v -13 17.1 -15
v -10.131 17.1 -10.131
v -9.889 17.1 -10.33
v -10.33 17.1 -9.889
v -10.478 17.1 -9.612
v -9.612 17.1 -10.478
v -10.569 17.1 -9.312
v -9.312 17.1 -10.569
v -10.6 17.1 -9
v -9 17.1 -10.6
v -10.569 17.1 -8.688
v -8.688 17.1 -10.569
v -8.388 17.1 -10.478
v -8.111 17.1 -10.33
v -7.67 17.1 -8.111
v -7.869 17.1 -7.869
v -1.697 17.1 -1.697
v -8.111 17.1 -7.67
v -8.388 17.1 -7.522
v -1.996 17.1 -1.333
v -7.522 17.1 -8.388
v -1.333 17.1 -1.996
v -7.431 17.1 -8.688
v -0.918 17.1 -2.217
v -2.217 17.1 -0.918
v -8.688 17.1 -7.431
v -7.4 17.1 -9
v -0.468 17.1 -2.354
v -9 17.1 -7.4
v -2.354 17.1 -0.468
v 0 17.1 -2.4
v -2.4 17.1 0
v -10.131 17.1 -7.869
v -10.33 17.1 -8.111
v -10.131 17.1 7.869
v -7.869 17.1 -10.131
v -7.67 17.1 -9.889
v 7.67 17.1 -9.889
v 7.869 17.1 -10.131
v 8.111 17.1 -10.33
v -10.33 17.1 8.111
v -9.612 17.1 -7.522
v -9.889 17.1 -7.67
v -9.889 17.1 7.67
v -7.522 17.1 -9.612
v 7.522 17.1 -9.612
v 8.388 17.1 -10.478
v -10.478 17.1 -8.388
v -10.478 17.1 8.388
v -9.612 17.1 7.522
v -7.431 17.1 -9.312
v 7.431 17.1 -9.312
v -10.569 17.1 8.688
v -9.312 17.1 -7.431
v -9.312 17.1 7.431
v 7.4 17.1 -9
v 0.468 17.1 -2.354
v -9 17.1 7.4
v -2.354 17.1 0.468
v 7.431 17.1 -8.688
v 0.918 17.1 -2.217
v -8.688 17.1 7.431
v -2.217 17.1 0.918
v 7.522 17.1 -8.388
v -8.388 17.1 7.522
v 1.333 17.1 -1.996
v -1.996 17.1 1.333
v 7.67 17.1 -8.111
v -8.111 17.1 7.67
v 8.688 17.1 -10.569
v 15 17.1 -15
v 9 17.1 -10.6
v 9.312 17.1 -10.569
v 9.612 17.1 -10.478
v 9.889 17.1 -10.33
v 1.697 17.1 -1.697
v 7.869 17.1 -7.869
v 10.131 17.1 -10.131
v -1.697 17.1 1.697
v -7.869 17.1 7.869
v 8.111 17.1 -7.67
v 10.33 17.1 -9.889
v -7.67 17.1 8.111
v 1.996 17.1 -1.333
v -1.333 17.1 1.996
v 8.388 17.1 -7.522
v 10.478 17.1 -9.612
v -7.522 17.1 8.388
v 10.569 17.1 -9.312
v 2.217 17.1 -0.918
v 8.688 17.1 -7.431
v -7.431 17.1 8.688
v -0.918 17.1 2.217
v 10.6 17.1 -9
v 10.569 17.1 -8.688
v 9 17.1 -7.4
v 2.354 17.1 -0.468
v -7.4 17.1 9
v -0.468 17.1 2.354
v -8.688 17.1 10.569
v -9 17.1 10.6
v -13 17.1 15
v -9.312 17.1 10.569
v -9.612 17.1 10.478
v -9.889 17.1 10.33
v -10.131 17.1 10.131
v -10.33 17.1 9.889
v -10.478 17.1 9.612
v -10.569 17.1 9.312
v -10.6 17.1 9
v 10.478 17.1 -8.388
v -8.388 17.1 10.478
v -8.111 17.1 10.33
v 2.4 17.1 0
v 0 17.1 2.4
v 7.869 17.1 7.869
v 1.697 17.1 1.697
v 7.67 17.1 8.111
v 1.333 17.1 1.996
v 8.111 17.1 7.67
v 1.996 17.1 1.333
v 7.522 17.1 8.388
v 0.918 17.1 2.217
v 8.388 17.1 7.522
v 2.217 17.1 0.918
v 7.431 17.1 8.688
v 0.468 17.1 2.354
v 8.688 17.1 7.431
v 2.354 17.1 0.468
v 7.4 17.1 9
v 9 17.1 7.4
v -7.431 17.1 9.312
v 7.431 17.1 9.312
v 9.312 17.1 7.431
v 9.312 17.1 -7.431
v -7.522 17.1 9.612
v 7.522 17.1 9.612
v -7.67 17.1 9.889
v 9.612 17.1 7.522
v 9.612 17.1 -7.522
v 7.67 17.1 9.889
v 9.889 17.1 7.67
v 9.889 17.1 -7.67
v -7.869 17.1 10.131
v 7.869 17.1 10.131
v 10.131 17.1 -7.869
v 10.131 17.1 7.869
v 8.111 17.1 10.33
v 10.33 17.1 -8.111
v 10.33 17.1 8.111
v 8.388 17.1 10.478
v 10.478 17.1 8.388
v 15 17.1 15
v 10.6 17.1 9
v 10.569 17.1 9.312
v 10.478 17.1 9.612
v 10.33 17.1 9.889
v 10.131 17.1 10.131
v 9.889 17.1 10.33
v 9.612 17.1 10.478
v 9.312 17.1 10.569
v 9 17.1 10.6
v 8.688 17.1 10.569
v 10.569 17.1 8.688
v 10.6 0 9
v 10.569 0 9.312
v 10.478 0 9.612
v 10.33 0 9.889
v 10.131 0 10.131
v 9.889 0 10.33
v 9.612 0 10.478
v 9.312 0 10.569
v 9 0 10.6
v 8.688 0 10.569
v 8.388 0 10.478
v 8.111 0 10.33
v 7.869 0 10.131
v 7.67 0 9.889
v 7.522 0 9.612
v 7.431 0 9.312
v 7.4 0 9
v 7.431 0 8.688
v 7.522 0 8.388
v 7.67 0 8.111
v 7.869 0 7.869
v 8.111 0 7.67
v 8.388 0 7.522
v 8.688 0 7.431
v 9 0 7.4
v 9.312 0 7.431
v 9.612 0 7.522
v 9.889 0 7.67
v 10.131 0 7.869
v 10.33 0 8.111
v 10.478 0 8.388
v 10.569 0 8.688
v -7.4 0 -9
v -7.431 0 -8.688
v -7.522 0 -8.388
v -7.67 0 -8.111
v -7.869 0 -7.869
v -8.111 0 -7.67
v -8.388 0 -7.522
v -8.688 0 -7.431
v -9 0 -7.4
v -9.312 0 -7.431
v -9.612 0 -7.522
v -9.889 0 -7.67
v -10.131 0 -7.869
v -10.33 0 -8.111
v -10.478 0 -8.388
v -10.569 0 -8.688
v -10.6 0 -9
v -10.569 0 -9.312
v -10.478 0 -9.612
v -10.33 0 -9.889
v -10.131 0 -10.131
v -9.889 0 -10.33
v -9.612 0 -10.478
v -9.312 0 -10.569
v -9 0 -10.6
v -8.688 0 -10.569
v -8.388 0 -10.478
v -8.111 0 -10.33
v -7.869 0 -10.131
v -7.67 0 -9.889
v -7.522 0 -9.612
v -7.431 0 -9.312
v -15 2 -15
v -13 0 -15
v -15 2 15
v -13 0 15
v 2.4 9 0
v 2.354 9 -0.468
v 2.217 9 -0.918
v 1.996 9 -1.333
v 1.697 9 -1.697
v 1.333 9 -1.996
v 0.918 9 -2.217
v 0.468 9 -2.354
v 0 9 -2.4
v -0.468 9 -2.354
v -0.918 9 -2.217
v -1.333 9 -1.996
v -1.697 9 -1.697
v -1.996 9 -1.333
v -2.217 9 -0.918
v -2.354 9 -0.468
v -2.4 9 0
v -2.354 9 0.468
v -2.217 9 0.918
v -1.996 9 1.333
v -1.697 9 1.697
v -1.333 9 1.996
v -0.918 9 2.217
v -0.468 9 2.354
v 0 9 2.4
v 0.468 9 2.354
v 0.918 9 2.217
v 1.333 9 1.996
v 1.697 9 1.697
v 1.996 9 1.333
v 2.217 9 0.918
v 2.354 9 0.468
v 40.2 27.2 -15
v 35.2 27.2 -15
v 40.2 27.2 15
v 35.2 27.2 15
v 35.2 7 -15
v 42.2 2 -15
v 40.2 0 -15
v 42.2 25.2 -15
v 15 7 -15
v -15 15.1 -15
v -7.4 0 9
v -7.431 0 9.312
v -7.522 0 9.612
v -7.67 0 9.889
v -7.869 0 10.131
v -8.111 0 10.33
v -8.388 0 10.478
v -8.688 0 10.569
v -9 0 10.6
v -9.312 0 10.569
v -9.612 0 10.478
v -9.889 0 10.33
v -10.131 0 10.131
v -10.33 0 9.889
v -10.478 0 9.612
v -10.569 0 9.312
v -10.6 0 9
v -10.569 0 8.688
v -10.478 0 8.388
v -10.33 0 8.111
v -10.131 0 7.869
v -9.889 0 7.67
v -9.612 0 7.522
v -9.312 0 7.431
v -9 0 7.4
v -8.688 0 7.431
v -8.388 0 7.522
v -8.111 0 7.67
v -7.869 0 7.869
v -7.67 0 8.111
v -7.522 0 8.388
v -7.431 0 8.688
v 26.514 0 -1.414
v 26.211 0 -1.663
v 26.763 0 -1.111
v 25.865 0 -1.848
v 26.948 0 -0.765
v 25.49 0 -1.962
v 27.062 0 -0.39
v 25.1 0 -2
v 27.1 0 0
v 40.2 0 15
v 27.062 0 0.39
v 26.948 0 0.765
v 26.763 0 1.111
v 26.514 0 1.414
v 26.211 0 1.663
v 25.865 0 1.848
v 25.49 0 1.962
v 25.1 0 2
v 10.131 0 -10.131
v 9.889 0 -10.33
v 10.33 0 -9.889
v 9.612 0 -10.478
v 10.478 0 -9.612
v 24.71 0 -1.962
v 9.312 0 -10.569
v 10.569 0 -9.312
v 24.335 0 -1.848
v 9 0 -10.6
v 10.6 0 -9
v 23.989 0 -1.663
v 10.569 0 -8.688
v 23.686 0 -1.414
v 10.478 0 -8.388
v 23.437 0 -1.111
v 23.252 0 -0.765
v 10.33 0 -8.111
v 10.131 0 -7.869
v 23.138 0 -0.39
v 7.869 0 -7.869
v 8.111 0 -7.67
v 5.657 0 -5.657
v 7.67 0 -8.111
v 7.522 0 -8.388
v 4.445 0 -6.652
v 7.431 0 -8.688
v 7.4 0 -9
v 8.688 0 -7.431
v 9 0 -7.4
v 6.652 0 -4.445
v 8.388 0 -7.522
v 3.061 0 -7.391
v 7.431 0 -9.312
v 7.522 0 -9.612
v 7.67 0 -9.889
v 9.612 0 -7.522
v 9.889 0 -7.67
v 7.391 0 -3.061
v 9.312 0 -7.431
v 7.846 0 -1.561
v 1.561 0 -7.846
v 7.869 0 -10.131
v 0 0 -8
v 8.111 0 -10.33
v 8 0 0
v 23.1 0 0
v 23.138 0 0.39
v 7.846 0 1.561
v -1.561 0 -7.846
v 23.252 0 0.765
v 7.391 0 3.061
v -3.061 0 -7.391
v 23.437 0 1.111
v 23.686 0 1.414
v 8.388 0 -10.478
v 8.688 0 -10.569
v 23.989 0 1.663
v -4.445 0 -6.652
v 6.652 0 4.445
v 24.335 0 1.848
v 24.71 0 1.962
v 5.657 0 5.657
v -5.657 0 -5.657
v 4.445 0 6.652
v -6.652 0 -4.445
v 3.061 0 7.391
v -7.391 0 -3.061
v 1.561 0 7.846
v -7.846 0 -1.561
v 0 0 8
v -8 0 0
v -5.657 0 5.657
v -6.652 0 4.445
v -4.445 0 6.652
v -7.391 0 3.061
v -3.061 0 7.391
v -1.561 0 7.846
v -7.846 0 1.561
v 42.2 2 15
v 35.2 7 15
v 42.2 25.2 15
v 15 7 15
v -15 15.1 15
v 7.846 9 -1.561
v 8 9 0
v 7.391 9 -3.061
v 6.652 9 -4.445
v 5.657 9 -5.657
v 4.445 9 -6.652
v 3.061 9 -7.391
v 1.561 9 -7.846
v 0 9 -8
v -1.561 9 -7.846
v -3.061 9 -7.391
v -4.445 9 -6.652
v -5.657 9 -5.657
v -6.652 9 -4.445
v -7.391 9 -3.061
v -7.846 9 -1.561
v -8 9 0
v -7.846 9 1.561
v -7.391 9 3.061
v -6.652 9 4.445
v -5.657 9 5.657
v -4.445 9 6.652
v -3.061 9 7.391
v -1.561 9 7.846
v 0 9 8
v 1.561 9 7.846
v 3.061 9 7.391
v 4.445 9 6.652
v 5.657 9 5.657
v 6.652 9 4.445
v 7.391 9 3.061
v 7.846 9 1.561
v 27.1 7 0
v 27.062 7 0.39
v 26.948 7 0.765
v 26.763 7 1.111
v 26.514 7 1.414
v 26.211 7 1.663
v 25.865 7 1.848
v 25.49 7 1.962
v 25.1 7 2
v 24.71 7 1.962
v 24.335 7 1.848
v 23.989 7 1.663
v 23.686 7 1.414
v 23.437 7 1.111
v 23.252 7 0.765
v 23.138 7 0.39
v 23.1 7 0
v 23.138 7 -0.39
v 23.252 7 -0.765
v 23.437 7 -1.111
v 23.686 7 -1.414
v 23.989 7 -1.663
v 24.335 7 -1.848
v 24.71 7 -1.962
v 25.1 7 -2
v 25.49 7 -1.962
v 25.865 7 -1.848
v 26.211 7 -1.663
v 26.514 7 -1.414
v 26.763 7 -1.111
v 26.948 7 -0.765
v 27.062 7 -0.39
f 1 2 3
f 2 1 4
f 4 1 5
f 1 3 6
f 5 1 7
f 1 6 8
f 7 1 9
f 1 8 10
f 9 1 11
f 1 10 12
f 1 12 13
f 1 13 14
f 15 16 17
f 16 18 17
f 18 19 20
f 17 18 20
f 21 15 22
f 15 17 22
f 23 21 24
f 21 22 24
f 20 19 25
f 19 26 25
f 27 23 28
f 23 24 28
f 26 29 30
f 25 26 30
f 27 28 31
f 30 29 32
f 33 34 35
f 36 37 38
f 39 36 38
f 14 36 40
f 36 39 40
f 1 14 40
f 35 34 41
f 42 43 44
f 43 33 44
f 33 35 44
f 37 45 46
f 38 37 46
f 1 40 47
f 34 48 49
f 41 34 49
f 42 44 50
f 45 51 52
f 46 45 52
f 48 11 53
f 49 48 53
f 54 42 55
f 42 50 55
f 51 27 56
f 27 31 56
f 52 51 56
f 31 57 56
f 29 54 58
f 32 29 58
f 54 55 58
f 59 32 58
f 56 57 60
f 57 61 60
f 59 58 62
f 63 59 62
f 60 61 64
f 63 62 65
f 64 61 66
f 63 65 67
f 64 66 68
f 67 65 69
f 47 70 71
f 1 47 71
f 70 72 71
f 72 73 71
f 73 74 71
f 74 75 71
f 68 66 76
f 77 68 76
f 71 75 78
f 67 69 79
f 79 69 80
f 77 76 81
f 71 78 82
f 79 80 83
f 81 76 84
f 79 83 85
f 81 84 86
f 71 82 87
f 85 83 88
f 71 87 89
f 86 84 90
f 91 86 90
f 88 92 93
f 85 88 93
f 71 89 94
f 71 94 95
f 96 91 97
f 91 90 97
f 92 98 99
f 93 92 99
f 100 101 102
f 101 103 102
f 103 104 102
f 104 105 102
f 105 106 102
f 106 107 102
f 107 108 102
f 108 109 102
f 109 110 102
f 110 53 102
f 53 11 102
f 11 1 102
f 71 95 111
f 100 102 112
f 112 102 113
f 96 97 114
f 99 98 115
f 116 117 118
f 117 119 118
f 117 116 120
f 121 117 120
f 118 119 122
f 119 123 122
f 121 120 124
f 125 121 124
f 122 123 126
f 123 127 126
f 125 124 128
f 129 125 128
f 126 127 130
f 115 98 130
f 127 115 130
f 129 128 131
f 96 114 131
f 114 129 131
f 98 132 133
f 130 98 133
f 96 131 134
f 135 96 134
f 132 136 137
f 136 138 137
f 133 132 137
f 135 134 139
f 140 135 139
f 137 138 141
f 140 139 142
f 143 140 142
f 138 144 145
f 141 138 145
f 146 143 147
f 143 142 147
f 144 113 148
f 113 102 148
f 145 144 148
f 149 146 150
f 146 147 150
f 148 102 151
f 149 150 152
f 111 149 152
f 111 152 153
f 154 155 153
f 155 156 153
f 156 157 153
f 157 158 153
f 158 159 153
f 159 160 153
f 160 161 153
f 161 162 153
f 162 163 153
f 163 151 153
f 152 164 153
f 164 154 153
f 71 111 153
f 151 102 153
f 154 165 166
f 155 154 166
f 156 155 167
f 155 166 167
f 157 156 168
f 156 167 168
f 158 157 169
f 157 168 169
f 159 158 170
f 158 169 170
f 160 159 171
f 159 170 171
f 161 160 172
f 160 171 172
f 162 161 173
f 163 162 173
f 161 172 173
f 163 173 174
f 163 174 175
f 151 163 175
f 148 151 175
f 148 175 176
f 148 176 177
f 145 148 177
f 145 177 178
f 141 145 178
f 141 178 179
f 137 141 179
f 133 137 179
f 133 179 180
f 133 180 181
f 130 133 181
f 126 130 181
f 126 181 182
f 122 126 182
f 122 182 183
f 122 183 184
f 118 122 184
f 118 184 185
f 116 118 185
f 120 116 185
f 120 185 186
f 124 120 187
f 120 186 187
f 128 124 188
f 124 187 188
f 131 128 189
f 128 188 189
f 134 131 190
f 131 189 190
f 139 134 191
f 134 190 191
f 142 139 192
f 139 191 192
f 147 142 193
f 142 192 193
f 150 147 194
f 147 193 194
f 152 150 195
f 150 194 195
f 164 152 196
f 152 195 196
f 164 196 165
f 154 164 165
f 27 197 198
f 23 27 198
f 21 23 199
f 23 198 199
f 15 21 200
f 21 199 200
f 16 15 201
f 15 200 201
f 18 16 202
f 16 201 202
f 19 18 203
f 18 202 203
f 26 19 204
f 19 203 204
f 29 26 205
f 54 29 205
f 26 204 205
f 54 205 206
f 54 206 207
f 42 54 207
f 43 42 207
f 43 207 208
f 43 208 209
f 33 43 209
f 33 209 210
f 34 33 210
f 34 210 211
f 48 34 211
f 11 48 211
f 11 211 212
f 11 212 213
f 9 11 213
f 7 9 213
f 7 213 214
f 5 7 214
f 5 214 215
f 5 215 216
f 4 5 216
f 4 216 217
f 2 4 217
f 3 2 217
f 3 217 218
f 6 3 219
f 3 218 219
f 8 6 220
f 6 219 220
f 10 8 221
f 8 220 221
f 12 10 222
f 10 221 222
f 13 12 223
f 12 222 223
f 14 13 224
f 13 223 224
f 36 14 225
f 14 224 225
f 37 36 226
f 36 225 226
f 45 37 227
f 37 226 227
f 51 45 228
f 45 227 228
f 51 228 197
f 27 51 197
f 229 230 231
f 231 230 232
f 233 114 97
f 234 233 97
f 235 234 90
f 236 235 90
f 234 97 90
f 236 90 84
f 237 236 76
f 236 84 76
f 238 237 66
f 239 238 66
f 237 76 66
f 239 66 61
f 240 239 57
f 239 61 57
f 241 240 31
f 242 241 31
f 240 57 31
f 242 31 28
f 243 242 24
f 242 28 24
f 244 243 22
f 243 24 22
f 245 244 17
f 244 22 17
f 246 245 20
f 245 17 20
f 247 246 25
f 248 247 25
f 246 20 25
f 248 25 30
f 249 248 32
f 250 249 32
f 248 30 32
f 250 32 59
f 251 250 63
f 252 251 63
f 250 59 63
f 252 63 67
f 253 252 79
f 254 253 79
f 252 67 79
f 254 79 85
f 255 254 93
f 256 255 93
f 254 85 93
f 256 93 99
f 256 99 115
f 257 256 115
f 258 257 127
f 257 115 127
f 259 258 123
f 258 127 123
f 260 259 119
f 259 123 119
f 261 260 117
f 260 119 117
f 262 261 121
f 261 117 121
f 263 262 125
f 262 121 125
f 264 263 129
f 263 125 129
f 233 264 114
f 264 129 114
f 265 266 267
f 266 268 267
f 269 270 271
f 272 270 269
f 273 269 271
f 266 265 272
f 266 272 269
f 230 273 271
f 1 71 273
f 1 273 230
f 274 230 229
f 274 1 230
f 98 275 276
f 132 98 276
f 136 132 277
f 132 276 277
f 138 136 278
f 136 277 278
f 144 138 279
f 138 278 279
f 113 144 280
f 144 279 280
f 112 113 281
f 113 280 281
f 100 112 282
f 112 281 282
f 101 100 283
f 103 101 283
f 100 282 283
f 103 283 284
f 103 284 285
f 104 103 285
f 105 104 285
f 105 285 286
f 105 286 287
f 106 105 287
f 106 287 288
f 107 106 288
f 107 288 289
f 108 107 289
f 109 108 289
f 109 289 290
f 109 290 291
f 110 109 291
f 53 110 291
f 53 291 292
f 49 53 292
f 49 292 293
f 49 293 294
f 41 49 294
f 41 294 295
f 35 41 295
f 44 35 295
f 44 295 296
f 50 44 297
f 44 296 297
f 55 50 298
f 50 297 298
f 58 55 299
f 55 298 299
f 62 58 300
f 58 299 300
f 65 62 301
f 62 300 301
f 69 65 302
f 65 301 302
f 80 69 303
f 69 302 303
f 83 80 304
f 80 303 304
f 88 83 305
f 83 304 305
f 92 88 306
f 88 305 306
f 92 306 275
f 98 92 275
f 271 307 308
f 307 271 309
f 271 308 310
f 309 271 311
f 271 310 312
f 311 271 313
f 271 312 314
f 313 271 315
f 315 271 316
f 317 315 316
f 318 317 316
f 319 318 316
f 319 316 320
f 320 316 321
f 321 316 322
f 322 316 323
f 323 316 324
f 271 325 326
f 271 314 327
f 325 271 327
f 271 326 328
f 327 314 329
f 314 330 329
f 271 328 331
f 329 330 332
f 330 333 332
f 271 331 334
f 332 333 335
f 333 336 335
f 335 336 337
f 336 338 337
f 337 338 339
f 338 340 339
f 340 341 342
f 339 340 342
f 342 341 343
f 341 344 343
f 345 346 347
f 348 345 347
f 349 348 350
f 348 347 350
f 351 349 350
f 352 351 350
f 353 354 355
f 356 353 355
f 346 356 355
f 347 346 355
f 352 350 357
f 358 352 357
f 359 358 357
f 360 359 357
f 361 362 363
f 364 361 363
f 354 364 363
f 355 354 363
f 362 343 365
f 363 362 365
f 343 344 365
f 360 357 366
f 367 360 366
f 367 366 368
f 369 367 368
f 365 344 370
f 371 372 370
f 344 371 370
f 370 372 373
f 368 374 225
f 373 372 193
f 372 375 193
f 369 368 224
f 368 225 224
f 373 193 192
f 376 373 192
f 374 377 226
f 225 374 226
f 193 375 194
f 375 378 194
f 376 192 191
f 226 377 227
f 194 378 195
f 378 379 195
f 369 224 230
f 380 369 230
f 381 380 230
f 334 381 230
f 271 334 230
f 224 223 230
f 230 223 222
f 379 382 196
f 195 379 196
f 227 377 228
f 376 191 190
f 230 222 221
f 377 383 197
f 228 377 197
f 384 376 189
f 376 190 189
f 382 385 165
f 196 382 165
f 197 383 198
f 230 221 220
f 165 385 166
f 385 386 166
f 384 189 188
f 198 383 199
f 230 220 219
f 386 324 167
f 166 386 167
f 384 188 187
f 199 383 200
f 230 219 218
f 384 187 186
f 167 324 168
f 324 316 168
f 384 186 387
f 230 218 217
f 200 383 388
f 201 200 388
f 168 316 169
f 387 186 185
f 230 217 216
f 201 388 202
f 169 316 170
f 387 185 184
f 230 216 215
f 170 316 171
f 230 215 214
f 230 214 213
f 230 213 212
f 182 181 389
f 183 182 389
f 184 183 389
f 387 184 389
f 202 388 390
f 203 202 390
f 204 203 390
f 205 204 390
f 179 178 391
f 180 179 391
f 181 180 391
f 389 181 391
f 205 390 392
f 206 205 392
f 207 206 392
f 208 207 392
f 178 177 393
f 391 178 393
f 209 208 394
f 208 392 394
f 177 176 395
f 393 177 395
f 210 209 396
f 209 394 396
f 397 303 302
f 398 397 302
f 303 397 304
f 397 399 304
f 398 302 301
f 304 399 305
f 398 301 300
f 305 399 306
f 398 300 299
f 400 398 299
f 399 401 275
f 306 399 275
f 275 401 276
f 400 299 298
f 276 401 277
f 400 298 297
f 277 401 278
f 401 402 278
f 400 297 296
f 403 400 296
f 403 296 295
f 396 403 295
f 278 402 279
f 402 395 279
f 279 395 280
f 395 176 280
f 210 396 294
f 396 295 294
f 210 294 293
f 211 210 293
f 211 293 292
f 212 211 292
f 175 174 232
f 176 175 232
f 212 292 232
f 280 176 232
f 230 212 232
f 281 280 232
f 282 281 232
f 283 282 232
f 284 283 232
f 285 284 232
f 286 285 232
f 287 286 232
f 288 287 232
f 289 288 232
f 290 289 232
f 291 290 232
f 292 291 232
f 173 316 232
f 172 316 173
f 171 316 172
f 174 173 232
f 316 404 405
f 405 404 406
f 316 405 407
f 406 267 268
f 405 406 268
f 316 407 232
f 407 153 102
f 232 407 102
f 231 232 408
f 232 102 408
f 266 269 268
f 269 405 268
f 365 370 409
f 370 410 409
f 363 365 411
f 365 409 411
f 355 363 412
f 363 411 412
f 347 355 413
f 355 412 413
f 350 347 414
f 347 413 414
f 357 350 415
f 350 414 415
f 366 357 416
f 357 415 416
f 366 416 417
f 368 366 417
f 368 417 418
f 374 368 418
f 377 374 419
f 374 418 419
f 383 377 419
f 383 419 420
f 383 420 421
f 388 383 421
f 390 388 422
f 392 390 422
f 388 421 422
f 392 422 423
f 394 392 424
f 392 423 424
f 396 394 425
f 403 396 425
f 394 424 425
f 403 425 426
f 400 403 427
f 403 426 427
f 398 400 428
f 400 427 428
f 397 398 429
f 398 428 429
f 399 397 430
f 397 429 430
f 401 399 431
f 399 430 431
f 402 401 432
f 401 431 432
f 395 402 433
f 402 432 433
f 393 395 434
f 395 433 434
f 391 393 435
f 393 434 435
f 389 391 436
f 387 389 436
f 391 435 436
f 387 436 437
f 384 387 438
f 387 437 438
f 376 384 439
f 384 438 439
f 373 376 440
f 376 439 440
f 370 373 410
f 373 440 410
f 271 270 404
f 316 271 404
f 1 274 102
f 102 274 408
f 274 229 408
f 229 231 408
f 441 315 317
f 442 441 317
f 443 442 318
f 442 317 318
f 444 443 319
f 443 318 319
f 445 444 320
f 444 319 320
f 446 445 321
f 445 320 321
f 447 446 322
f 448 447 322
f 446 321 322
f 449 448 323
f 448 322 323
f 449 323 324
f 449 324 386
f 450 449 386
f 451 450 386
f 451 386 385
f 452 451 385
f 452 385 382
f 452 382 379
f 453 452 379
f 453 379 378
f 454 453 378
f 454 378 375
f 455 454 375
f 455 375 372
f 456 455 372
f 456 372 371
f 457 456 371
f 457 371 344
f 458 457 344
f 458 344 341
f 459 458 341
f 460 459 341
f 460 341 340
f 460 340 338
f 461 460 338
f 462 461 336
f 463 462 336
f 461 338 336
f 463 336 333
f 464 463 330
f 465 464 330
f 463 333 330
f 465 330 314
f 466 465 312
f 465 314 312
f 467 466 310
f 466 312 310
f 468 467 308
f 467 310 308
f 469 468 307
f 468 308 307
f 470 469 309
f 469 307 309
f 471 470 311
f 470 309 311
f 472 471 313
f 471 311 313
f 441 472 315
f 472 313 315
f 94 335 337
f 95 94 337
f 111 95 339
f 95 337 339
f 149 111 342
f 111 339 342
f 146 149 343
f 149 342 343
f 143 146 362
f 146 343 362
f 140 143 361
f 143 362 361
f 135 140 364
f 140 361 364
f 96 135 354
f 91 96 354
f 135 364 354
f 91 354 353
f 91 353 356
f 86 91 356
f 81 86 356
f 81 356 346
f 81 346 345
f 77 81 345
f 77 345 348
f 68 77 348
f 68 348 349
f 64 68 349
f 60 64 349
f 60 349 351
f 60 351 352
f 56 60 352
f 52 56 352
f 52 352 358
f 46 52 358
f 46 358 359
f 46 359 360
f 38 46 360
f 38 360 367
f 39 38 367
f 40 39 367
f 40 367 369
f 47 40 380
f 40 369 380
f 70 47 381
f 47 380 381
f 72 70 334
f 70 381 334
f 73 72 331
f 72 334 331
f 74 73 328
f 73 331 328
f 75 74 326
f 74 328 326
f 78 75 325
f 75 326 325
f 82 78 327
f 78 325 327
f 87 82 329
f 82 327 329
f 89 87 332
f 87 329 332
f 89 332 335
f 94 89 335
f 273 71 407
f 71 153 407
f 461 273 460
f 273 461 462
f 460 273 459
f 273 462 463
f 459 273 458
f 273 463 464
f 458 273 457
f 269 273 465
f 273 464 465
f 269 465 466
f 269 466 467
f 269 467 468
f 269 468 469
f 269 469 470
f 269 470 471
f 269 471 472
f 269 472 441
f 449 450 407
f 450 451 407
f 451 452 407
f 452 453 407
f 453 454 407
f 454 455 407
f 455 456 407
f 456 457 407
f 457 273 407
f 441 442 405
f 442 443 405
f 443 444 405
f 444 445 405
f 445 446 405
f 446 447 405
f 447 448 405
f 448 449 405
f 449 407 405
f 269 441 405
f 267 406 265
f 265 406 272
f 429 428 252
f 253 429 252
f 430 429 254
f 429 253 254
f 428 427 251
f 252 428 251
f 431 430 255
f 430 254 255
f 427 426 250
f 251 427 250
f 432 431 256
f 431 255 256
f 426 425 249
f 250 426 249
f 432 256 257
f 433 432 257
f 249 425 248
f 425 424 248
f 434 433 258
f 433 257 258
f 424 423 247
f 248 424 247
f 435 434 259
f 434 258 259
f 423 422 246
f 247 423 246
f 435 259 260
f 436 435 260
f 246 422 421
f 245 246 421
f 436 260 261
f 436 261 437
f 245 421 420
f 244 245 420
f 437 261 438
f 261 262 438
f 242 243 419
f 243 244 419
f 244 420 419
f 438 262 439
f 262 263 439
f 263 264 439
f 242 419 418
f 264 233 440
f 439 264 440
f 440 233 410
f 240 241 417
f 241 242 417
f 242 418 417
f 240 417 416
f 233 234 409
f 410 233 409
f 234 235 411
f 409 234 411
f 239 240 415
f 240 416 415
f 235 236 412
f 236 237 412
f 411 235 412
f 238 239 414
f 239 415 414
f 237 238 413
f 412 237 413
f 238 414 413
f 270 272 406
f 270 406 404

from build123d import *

# Parameters (mm, degrees)
PAD_DEPTH     = 15
SKETCH002_R   = 1.6
SKETCH002_R_2 = 2
POCKET_DEPTH  = 27.201
CHAMFER_SIZE  = 2


with BuildPart() as bodyinner:
    # Sketch001 → Revolution (revolve)
    with BuildSketch(Plane.XY):
        Polygon((0, 0), (8, 0), (8, 9), (2.4, 9), (2.4, 35), (0, 35), align=None)
    revolve(axis=Axis((0, 0, 0), (0, 1, 0)))


with BuildPart() as chamfer_body:
    # Sketch → Pad (new body, symmetric)
    with BuildSketch(Plane.XY):
        Polygon((-15, 17.1), (15, 17.1), (15, 7), (35.2, 7), (35.2, 27.2), (42.2, 27.2), (42.2, 0), (-15, 0), align=None)
    extrude(amount=PAD_DEPTH, both=True)

    # Sketch002 → Pocket (cut, through all)
    with BuildSketch(Plane.XZ):
        with Locations((-9, 9)):
            Circle(SKETCH002_R)
        with Locations((9, 9)):
            Circle(SKETCH002_R)
        with Locations((9, -9)):
            Circle(SKETCH002_R)
        with Locations((-9, -9)):
            Circle(SKETCH002_R)
        with Locations((25.1, 0)):
            Circle(SKETCH002_R_2)
    extrude(amount=-POCKET_DEPTH, mode=Mode.SUBTRACT)

    # Cut: cut BodyInner
    add(bodyinner.part, mode=Mode.SUBTRACT)

    # Chamfer
    chamfer_edges = [chamfer_body.edges().sort_by_distance(p)[0] for p in [
        (-15, 17.1, 0),
        (-15, 0, 0),
        (42.2, 0, 0),
        (42.2, 27.2, 0),
    ]]
    chamfer(chamfer_edges, length=CHAMFER_SIZE)


solid = chamfer_body.part
